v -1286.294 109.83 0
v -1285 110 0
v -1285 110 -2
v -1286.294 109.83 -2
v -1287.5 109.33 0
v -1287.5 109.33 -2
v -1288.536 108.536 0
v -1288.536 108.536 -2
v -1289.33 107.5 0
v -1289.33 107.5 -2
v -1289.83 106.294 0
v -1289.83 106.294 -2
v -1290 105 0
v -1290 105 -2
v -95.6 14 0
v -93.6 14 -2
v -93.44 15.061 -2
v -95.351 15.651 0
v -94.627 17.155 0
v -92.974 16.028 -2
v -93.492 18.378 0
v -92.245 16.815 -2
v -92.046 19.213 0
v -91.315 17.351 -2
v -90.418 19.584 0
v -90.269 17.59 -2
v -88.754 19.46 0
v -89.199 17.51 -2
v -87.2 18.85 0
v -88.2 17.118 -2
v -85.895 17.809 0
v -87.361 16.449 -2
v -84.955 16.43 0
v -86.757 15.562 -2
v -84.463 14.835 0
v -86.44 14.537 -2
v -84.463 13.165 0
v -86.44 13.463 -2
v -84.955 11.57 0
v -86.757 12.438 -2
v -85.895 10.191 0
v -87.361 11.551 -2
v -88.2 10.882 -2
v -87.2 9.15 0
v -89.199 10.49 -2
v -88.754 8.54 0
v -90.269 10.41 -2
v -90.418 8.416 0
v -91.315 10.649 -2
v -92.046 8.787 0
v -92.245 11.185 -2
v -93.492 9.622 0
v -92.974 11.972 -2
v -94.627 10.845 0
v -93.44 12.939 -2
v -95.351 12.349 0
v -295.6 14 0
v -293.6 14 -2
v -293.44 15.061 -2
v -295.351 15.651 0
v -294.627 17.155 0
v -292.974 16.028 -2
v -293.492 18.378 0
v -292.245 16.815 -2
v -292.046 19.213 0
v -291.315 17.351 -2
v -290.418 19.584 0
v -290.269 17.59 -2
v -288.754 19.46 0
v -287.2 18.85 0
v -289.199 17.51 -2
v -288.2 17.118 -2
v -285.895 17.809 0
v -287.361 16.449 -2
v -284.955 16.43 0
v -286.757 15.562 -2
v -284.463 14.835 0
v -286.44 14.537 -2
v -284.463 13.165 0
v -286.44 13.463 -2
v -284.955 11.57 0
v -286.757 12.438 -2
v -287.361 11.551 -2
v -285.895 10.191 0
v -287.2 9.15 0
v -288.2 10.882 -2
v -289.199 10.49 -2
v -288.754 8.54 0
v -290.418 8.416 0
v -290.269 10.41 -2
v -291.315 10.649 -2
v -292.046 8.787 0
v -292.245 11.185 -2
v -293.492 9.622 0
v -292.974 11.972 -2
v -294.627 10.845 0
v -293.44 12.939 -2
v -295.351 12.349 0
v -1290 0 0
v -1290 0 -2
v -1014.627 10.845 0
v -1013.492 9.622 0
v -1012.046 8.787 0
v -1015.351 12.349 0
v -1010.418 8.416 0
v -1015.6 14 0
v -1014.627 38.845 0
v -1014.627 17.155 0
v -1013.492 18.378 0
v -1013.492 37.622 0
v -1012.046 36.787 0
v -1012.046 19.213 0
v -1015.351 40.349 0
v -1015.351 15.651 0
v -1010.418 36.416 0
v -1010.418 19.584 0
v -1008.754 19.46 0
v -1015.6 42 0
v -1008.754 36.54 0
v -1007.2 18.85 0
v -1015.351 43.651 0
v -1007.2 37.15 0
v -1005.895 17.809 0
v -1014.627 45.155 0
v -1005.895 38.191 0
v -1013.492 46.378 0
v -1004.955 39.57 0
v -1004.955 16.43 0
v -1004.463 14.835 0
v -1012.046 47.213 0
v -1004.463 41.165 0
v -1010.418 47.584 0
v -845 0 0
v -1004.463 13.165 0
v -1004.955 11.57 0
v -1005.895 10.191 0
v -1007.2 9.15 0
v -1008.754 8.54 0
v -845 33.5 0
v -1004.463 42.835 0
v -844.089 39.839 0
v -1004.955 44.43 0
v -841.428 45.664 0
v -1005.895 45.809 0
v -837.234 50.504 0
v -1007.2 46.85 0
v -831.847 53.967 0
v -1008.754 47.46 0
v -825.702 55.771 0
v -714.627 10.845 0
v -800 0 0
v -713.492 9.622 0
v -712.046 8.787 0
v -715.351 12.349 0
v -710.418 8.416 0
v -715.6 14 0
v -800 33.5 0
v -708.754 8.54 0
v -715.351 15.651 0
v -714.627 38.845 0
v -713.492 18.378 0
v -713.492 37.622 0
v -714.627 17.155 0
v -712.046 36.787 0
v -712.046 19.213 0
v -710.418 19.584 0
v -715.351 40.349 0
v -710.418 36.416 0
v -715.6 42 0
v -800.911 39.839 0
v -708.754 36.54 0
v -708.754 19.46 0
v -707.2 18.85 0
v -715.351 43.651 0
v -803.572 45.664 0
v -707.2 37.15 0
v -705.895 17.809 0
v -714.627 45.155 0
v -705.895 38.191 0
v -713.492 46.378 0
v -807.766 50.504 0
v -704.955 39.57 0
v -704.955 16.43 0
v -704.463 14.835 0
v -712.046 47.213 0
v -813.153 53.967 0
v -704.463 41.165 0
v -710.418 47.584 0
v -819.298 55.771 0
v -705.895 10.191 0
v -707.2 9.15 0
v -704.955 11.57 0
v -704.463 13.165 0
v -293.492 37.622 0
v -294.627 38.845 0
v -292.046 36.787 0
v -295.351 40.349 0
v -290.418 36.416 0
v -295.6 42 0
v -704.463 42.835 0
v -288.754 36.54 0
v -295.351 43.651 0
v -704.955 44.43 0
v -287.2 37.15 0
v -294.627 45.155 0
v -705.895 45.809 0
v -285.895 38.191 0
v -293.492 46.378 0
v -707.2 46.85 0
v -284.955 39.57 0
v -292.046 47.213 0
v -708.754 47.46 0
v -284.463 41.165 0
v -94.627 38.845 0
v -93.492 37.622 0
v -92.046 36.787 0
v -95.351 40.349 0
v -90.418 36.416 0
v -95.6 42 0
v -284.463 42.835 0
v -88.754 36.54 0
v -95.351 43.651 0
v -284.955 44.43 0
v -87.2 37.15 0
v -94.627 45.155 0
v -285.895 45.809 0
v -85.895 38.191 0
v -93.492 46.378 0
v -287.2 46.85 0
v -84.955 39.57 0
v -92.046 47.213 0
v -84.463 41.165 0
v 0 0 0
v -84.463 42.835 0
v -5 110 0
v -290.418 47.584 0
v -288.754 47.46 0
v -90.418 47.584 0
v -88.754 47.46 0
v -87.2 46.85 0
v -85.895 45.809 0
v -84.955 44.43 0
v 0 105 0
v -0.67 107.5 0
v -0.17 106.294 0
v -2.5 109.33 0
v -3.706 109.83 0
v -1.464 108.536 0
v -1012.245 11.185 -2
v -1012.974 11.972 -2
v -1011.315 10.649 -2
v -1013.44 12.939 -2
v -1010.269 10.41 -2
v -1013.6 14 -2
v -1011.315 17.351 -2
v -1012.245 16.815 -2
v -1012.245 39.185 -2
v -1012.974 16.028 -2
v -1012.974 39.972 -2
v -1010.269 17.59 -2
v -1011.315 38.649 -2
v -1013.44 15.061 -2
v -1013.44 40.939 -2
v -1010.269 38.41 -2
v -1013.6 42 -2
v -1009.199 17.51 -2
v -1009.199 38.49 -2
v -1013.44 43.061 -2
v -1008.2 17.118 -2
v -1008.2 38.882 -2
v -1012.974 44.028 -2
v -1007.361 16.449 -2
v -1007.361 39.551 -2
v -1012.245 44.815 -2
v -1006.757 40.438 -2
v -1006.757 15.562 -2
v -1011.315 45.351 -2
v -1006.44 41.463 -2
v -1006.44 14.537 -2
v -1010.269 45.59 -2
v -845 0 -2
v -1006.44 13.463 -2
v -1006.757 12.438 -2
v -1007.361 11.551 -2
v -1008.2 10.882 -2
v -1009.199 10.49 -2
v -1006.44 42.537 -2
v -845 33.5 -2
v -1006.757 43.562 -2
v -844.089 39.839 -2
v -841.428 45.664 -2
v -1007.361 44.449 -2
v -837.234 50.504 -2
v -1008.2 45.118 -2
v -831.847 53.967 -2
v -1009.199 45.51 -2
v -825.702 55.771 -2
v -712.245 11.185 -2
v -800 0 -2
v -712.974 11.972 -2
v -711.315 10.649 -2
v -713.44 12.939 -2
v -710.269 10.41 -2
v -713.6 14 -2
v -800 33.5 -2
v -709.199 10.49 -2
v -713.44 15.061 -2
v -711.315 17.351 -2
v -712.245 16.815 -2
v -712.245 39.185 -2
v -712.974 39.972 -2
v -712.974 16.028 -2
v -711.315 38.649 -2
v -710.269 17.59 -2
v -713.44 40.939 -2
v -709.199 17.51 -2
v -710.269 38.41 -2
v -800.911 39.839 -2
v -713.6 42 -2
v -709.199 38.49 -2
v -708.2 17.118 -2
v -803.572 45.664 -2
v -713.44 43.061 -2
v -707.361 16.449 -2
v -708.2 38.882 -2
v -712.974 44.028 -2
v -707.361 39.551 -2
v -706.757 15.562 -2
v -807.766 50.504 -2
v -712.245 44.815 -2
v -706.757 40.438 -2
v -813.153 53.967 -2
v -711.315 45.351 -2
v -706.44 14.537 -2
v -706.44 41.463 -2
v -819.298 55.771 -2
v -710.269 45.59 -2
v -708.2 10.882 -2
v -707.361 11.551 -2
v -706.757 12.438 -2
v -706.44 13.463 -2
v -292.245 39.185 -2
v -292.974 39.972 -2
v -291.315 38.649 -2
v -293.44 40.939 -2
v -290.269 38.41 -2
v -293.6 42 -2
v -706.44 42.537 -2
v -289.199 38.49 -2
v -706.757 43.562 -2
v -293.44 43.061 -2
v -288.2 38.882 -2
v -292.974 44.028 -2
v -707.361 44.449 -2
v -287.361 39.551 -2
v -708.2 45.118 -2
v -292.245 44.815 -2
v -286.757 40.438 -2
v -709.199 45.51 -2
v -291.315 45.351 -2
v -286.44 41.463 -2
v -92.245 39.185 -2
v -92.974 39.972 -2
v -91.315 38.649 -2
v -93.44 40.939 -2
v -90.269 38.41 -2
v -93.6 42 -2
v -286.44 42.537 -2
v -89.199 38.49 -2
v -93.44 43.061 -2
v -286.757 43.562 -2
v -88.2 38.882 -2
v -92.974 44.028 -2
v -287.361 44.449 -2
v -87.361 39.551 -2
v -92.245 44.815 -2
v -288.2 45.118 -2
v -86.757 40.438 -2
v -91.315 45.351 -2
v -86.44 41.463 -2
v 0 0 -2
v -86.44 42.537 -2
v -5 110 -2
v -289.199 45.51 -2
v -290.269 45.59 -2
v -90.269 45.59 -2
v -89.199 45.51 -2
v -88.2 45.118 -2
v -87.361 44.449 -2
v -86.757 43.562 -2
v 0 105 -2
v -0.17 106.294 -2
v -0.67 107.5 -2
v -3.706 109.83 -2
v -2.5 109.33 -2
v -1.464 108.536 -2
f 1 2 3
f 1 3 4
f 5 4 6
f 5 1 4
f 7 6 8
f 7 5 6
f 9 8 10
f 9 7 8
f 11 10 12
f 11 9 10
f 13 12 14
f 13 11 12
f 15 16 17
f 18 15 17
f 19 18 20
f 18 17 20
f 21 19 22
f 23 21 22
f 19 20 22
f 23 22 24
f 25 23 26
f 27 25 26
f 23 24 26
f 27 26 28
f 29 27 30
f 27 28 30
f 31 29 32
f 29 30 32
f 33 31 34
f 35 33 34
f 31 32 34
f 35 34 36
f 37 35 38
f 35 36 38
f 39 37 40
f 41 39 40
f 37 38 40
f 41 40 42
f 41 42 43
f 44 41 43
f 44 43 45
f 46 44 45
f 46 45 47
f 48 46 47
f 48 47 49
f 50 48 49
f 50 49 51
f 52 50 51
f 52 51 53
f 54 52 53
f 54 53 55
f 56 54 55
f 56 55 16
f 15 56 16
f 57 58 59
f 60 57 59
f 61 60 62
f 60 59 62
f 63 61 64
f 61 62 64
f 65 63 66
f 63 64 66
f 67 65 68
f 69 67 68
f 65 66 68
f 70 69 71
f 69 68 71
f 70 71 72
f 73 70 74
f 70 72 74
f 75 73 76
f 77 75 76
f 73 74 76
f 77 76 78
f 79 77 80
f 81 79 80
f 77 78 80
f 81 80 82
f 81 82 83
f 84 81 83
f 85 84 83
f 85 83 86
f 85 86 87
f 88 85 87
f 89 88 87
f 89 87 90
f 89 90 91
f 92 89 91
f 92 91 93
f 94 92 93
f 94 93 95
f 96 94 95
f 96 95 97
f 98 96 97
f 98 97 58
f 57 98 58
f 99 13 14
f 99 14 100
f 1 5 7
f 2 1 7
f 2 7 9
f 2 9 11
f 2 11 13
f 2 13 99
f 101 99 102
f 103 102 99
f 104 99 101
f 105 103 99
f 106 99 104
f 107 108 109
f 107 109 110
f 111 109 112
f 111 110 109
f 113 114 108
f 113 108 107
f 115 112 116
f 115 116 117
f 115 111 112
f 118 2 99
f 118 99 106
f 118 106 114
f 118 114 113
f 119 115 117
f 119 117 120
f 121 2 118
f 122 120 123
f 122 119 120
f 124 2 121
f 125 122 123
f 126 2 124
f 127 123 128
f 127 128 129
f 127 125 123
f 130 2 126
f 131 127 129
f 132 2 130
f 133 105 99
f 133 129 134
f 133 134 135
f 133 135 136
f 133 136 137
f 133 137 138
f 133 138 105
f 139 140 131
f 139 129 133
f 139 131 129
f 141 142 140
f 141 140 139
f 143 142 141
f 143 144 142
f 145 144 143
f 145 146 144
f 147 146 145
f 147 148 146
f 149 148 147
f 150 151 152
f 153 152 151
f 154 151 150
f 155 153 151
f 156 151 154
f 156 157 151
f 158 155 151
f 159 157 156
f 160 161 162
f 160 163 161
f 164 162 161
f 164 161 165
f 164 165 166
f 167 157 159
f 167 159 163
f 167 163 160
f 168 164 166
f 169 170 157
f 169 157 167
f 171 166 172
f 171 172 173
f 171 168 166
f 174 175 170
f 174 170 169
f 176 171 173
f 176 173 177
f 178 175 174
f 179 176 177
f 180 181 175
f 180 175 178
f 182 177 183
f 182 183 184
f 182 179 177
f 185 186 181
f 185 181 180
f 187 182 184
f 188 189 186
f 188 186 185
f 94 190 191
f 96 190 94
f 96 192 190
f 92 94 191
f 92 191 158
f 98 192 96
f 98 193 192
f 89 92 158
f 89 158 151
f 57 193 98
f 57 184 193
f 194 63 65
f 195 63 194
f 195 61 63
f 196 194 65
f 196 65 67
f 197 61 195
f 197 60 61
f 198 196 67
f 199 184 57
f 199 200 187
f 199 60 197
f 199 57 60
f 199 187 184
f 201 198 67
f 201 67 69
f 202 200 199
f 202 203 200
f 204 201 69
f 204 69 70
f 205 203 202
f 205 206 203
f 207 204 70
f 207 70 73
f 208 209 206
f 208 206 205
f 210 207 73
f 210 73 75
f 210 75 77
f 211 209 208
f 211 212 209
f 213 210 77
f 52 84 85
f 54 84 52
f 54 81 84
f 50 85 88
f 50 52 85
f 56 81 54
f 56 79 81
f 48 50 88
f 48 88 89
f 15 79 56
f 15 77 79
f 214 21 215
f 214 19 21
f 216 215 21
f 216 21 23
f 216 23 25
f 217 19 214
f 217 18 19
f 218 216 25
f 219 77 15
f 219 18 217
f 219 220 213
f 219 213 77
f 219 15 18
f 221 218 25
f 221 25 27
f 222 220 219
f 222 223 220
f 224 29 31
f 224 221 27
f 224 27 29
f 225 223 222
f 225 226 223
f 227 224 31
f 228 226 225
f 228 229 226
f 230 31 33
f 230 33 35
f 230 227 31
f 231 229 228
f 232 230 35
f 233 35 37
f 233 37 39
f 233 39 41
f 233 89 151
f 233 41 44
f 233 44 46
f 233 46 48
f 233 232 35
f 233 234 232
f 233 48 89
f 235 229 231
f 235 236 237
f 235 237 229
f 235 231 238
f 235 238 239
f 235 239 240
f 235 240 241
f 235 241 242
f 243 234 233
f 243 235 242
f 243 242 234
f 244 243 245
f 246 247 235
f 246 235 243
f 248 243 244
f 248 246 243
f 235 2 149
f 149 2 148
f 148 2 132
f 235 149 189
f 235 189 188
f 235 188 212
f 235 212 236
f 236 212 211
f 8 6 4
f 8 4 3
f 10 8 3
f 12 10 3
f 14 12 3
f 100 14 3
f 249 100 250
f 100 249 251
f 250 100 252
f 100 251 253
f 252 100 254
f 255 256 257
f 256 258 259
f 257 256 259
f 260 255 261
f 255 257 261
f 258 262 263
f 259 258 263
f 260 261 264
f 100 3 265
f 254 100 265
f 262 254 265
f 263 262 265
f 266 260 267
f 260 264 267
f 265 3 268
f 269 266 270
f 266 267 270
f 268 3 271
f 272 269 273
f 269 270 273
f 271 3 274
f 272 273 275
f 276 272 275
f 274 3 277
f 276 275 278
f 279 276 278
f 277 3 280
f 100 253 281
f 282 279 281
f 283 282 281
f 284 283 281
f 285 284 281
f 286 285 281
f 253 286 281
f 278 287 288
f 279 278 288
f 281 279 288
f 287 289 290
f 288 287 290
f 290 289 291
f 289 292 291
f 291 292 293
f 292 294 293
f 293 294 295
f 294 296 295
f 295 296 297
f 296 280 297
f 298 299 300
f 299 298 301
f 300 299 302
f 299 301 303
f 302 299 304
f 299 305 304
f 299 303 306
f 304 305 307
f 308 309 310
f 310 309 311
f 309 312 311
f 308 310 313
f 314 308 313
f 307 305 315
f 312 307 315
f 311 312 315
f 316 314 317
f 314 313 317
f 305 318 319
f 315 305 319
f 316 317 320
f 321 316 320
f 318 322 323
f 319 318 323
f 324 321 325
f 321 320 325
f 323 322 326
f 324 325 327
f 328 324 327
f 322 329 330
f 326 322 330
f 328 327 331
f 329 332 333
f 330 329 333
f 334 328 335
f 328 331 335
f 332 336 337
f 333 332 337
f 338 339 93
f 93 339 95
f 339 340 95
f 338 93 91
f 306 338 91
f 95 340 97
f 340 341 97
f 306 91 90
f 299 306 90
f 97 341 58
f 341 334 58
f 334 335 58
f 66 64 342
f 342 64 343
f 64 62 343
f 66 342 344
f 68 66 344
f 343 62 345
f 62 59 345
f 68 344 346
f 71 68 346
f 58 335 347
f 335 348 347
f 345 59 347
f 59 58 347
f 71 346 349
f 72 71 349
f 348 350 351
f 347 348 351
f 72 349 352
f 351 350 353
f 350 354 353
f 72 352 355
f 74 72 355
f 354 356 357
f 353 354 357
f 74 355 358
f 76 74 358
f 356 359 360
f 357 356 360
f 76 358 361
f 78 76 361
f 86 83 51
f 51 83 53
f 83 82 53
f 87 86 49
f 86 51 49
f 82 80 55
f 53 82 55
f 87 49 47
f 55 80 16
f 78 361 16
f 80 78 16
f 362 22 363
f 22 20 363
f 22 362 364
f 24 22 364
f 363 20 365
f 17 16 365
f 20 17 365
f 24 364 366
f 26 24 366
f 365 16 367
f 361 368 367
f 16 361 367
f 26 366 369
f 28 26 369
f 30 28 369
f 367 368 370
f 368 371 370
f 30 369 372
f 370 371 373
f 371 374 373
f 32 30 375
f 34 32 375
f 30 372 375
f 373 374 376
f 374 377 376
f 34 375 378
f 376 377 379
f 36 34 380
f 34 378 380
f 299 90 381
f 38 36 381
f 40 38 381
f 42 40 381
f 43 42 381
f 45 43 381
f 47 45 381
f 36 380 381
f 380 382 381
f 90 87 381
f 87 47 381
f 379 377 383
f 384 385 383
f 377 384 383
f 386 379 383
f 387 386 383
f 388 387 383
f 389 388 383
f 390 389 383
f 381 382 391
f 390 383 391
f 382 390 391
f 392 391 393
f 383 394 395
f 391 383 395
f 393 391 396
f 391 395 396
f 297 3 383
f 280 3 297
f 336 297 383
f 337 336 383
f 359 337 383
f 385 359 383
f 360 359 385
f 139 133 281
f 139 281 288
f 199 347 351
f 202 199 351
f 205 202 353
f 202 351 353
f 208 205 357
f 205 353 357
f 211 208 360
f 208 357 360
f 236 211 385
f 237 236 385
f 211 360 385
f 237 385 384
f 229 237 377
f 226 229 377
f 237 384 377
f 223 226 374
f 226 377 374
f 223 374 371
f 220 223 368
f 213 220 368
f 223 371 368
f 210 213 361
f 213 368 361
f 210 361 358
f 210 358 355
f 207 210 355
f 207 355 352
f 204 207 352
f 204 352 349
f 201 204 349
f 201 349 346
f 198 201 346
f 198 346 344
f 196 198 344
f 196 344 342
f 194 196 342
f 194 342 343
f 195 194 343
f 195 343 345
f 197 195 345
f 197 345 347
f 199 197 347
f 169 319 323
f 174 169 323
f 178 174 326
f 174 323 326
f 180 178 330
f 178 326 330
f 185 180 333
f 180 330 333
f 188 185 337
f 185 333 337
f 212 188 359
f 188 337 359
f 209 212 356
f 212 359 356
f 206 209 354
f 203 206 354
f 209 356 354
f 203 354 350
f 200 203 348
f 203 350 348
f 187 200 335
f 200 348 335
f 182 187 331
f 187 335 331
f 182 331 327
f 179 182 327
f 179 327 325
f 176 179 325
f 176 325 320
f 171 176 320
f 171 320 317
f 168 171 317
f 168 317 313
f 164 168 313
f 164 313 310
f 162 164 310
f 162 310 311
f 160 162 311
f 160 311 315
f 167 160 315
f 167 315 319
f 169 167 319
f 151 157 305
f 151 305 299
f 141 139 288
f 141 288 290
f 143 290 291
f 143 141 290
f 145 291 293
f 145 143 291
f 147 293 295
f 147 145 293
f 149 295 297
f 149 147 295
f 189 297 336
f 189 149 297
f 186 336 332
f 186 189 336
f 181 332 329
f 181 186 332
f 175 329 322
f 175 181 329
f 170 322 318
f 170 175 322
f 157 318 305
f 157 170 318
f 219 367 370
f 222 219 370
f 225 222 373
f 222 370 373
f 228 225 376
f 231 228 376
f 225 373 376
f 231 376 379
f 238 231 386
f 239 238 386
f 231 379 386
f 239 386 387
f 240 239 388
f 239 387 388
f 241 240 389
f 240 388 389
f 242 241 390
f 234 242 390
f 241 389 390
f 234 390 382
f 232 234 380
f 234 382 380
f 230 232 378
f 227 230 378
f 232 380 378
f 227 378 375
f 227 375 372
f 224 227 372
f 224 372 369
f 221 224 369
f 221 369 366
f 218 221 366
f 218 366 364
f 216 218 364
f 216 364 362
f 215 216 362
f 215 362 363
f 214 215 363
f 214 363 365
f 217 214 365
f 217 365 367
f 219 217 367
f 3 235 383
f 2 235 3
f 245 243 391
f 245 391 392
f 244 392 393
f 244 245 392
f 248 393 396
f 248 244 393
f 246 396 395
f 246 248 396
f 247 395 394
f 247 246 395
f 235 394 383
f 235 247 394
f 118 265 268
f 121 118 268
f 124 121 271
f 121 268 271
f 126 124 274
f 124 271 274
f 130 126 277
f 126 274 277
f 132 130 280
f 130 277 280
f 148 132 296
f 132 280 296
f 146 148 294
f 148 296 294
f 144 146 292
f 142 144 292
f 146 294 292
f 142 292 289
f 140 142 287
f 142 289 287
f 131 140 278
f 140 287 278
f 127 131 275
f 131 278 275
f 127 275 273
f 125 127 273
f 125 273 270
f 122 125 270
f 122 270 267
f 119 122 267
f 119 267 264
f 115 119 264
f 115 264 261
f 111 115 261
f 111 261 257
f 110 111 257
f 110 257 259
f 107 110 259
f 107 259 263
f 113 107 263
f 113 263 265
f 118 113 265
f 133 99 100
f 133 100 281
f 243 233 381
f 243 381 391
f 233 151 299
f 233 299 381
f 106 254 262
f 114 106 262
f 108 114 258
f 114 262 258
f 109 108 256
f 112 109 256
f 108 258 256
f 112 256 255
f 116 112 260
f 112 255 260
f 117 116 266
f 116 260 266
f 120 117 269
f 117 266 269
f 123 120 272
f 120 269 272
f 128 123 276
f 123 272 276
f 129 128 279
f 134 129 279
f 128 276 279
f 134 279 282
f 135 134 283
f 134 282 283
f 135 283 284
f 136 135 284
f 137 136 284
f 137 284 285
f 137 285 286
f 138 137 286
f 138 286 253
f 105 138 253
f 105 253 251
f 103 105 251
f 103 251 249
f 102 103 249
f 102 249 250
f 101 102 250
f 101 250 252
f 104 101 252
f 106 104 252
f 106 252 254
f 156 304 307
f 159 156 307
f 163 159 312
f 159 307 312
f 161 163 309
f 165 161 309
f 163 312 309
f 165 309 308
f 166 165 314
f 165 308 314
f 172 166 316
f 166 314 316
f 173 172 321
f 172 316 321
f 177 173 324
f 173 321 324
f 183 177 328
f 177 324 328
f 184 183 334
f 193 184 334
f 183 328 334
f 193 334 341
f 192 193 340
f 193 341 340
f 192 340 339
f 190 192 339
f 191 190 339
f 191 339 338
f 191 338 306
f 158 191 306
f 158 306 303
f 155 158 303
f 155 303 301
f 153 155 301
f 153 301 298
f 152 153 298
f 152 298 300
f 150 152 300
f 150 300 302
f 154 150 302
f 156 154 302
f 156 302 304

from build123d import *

# Parameters (mm, degrees)
F1_DEPTH       = 2
F2_D           = 5.5
F2_CSINK_D     = 11.2
F2_CSINK_ANGLE = 90


with BuildPart() as f1:
    # F0 (on Top) → F1 (new body)
    with BuildSketch(Plane.XY):
        with BuildLine():
            Line((-800, 0), (0, 0))
            Line((0, 0), (0, 105))
            ThreePointArc((0, 105), (-1.4644660941, 108.5355339059), (-5, 110))
            Line((-5, 110), (-1285, 110))
            ThreePointArc((-1285, 110), (-1288.5355339059, 108.5355339059), (-1290, 105))
            Line((-1290, 105), (-1290, 0))
            Line((-1290, 0), (-845, 0))
            Line((-845, 0), (-845, 33.5))
            ThreePointArc((-845, 33.5), (-822.5, 56), (-800, 33.5))
            Line((-800, 33.5), (-800, 0))
        make_face()
    extrude(amount=-F1_DEPTH)

    # F2 (through all)
    with Locations(Plane.XY):
        with Locations((-1010, 42), (-1010, 14), (-710, 42), (-710, 14), (-290, 42), (-290, 14), (-90, 42), (-90, 14)):
            CounterSinkHole(F2_D / 2, F2_CSINK_D / 2, counter_sink_angle=F2_CSINK_ANGLE)


solid = f1.part
